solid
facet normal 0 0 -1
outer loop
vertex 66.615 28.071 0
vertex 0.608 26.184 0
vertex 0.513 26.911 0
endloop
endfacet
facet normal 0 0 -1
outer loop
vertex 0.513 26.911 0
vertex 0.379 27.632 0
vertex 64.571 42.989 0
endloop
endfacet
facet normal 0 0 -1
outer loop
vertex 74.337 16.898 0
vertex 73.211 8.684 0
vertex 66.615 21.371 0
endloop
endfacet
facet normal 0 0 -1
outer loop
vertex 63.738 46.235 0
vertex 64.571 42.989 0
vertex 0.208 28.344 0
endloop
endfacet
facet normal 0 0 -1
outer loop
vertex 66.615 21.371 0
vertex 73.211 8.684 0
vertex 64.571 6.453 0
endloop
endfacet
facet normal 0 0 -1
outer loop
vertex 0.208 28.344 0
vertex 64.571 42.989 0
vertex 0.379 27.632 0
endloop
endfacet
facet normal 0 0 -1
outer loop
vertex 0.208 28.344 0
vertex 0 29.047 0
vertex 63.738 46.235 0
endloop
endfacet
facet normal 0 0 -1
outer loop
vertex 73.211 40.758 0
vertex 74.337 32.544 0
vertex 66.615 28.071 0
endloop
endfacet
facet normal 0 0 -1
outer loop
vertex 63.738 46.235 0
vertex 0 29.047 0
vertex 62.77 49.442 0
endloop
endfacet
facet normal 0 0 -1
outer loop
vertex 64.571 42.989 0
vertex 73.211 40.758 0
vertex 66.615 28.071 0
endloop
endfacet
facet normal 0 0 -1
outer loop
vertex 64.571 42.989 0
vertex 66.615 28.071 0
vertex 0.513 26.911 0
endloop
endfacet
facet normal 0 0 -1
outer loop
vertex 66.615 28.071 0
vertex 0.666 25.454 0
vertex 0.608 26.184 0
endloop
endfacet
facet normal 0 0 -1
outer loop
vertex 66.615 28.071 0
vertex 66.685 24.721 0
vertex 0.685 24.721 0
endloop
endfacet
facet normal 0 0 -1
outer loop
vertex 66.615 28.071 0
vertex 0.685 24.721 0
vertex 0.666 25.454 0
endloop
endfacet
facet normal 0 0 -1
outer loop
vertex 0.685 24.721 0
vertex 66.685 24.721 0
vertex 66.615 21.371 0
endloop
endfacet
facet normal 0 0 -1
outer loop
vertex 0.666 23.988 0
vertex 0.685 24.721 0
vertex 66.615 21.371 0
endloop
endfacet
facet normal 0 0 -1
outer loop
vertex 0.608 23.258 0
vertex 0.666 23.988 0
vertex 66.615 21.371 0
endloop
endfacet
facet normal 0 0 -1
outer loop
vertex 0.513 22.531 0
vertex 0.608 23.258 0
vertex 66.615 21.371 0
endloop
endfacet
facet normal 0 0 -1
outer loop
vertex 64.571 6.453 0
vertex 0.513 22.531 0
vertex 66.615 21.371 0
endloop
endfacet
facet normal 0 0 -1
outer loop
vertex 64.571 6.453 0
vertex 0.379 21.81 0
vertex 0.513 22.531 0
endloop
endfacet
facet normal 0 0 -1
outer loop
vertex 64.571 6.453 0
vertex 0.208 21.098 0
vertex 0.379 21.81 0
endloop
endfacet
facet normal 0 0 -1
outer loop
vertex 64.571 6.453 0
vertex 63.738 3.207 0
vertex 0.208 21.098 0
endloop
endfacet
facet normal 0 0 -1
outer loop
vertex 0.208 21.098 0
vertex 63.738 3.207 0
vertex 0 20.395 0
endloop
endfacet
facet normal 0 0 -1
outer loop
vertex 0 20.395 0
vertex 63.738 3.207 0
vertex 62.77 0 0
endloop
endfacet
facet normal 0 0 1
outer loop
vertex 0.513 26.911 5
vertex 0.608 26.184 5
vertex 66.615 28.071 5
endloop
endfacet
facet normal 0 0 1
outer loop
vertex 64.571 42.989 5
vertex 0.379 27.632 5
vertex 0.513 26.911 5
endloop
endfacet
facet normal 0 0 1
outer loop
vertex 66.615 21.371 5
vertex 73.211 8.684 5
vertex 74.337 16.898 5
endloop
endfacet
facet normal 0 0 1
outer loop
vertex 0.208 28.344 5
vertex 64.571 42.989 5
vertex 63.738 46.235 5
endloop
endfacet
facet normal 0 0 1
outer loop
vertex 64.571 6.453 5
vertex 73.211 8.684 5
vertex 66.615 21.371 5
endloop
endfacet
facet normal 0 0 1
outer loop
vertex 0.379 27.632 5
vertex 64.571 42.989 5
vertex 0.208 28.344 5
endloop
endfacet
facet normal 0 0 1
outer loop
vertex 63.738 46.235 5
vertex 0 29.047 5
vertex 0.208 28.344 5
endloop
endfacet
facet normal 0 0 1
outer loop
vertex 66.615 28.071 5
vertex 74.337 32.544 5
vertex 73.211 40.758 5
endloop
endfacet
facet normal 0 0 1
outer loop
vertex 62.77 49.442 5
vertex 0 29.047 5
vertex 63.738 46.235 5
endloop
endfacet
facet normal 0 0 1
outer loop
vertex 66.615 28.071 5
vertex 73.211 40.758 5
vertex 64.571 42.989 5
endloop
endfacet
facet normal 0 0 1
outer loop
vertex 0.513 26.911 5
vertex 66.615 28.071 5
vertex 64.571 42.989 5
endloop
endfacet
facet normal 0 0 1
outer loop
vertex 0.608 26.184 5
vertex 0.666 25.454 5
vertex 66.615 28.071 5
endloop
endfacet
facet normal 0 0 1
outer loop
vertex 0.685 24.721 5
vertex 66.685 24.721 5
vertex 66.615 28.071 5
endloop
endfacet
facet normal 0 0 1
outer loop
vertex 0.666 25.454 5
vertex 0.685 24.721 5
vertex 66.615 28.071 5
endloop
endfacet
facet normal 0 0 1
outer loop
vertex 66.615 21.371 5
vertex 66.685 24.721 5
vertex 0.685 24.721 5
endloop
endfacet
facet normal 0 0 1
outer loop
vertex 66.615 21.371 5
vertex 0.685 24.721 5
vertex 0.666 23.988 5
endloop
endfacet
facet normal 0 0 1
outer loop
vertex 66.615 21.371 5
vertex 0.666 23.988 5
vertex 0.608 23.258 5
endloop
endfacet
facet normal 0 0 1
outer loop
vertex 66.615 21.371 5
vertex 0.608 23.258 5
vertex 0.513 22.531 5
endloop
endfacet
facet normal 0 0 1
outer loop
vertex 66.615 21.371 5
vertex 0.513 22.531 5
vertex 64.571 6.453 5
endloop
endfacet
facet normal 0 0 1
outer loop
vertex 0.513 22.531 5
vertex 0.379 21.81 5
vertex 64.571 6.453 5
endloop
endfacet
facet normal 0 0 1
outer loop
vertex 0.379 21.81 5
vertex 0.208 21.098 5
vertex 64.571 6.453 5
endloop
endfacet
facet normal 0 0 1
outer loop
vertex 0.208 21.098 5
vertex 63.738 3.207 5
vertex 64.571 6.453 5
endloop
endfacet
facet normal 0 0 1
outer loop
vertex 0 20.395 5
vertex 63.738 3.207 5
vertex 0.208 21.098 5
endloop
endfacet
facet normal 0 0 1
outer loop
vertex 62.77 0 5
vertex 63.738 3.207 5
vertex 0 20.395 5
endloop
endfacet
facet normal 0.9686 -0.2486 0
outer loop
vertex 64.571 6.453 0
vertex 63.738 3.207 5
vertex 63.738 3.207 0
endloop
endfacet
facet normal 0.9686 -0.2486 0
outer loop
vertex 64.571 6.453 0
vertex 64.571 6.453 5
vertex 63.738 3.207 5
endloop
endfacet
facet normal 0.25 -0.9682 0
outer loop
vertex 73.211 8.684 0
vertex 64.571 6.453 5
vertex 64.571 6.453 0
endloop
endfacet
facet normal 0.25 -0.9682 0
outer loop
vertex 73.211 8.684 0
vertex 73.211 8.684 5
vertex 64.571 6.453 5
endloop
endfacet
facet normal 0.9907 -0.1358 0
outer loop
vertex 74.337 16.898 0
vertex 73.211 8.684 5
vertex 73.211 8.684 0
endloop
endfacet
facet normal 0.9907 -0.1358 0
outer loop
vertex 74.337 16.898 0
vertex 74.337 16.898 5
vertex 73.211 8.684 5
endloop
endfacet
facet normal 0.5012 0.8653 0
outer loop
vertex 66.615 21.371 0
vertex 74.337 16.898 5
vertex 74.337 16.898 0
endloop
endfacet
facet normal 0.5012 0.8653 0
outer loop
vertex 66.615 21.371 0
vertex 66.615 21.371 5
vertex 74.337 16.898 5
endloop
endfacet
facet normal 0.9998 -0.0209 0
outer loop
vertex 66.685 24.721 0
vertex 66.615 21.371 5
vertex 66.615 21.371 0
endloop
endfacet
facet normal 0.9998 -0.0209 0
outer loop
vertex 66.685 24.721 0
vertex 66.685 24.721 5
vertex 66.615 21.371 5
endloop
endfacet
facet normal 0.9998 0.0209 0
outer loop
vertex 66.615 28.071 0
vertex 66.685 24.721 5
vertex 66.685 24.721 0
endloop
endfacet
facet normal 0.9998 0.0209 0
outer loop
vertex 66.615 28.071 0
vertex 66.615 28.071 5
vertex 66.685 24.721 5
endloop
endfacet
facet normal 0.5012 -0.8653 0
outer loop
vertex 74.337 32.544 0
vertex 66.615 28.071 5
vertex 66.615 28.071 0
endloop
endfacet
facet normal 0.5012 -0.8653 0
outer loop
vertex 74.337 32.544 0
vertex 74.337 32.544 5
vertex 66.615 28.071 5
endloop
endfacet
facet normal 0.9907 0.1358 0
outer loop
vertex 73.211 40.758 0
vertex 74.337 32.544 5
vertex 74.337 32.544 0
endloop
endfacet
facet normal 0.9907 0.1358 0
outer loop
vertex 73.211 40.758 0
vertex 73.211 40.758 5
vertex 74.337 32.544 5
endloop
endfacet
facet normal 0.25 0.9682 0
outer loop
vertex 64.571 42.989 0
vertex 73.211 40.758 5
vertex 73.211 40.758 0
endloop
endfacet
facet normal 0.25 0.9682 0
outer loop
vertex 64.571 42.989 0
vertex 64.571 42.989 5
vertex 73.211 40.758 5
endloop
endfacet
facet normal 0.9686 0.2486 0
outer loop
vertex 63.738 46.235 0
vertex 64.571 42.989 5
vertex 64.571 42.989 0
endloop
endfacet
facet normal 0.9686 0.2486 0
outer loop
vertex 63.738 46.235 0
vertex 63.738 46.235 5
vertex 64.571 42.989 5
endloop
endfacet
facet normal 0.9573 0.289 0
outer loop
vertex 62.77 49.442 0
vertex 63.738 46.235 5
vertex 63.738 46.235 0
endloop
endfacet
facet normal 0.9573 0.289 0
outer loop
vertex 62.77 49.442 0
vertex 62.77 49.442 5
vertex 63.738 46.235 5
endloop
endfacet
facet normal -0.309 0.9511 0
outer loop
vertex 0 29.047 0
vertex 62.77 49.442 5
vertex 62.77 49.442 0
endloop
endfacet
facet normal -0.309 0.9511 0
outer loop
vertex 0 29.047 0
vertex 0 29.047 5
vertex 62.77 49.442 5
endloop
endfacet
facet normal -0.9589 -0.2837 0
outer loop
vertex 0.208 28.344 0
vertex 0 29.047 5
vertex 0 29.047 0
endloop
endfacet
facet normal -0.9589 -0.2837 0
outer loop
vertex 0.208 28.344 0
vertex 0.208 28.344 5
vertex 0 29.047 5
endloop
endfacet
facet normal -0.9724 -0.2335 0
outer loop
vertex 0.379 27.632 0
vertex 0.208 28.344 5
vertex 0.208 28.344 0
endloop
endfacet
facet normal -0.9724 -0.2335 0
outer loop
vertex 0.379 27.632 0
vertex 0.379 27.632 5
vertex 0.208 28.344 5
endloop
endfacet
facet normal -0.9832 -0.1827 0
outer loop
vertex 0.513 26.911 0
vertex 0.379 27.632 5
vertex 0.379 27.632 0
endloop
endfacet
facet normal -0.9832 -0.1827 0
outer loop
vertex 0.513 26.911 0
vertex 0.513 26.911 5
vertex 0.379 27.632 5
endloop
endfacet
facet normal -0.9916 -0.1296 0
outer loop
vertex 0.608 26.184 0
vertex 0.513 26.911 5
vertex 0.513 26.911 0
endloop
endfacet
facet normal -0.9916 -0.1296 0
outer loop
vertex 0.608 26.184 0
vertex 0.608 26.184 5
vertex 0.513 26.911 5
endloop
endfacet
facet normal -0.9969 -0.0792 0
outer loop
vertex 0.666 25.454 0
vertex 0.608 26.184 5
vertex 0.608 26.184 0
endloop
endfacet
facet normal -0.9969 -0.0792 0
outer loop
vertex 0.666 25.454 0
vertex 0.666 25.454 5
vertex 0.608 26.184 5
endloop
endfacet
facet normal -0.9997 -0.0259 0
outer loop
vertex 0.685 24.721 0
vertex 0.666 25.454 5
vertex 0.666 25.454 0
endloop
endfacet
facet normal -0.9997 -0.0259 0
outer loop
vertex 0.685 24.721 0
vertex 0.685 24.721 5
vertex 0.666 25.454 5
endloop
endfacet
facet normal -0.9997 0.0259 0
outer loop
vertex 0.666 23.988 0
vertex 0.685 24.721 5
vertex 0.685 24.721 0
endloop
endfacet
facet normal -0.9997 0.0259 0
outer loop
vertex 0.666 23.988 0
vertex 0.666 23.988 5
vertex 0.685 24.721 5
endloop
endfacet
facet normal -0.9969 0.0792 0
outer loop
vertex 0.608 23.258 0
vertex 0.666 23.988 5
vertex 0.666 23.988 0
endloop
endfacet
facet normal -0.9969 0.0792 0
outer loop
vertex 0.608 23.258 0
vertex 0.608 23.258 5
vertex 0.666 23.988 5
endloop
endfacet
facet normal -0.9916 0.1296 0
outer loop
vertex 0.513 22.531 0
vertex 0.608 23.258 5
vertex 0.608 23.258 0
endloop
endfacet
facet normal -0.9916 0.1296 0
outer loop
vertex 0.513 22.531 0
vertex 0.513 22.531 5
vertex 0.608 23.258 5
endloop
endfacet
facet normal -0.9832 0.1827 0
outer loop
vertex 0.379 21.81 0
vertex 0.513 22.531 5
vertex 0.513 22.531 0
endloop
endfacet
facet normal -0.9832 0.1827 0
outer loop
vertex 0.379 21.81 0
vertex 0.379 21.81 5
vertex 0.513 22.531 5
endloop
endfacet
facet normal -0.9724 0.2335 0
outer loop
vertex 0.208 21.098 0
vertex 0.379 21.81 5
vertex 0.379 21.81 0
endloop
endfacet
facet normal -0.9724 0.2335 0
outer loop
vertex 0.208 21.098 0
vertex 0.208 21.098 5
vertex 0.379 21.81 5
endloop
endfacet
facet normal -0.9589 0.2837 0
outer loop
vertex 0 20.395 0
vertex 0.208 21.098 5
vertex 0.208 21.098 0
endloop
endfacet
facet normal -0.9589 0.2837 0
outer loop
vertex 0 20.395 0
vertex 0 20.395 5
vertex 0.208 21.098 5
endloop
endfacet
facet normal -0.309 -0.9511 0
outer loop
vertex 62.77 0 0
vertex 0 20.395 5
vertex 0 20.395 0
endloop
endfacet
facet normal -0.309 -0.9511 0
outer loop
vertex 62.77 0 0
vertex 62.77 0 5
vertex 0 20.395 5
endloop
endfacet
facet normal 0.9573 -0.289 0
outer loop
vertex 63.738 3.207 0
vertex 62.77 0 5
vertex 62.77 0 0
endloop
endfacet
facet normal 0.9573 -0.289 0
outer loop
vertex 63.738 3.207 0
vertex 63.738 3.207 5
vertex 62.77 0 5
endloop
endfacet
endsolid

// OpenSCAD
$fn = 32;

// ----------------------------------------------------------------------
// Gear sector: 2 teeth on 36 degrees
// ----------------------------------------------------------------------

// --- parameters (mm) ---
sector_angle = 36;        // sector angle, degrees
root_r = 80;              // root circle radius
tooth_h = 8;              // tooth height over the root circle
teeth = 2;                // number of teeth on the sector
hub_r = 14;               // hub bore radius
plate_t = 5;              // sector thickness, Z
arc_step = 3;             // sampling step of the root/hub arcs, degrees

tip_r = root_r + tooth_h;  // tip circle radius

profile = [[62.77, 0], [63.738, 3.207], [64.571, 6.453], [73.211, 8.684], [74.337, 16.898], [66.615, 21.371], [66.685, 24.721], [66.615, 28.071], [74.337, 32.544], [73.211, 40.758], [64.571, 42.989], [63.738, 46.235], [62.77, 49.442], [0, 29.047], [0.208, 28.344], [0.379, 27.632], [0.513, 26.911], [0.608, 26.184], [0.666, 25.454], [0.685, 24.721], [0.666, 23.988], [0.608, 23.258], [0.513, 22.531], [0.379, 21.81], [0.208, 21.098], [0, 20.395]];  // primary outline, 26 points, counter clockwise

// --- the one profile operation ---
linear_extrude(height = plate_t) polygon(points = profile);
